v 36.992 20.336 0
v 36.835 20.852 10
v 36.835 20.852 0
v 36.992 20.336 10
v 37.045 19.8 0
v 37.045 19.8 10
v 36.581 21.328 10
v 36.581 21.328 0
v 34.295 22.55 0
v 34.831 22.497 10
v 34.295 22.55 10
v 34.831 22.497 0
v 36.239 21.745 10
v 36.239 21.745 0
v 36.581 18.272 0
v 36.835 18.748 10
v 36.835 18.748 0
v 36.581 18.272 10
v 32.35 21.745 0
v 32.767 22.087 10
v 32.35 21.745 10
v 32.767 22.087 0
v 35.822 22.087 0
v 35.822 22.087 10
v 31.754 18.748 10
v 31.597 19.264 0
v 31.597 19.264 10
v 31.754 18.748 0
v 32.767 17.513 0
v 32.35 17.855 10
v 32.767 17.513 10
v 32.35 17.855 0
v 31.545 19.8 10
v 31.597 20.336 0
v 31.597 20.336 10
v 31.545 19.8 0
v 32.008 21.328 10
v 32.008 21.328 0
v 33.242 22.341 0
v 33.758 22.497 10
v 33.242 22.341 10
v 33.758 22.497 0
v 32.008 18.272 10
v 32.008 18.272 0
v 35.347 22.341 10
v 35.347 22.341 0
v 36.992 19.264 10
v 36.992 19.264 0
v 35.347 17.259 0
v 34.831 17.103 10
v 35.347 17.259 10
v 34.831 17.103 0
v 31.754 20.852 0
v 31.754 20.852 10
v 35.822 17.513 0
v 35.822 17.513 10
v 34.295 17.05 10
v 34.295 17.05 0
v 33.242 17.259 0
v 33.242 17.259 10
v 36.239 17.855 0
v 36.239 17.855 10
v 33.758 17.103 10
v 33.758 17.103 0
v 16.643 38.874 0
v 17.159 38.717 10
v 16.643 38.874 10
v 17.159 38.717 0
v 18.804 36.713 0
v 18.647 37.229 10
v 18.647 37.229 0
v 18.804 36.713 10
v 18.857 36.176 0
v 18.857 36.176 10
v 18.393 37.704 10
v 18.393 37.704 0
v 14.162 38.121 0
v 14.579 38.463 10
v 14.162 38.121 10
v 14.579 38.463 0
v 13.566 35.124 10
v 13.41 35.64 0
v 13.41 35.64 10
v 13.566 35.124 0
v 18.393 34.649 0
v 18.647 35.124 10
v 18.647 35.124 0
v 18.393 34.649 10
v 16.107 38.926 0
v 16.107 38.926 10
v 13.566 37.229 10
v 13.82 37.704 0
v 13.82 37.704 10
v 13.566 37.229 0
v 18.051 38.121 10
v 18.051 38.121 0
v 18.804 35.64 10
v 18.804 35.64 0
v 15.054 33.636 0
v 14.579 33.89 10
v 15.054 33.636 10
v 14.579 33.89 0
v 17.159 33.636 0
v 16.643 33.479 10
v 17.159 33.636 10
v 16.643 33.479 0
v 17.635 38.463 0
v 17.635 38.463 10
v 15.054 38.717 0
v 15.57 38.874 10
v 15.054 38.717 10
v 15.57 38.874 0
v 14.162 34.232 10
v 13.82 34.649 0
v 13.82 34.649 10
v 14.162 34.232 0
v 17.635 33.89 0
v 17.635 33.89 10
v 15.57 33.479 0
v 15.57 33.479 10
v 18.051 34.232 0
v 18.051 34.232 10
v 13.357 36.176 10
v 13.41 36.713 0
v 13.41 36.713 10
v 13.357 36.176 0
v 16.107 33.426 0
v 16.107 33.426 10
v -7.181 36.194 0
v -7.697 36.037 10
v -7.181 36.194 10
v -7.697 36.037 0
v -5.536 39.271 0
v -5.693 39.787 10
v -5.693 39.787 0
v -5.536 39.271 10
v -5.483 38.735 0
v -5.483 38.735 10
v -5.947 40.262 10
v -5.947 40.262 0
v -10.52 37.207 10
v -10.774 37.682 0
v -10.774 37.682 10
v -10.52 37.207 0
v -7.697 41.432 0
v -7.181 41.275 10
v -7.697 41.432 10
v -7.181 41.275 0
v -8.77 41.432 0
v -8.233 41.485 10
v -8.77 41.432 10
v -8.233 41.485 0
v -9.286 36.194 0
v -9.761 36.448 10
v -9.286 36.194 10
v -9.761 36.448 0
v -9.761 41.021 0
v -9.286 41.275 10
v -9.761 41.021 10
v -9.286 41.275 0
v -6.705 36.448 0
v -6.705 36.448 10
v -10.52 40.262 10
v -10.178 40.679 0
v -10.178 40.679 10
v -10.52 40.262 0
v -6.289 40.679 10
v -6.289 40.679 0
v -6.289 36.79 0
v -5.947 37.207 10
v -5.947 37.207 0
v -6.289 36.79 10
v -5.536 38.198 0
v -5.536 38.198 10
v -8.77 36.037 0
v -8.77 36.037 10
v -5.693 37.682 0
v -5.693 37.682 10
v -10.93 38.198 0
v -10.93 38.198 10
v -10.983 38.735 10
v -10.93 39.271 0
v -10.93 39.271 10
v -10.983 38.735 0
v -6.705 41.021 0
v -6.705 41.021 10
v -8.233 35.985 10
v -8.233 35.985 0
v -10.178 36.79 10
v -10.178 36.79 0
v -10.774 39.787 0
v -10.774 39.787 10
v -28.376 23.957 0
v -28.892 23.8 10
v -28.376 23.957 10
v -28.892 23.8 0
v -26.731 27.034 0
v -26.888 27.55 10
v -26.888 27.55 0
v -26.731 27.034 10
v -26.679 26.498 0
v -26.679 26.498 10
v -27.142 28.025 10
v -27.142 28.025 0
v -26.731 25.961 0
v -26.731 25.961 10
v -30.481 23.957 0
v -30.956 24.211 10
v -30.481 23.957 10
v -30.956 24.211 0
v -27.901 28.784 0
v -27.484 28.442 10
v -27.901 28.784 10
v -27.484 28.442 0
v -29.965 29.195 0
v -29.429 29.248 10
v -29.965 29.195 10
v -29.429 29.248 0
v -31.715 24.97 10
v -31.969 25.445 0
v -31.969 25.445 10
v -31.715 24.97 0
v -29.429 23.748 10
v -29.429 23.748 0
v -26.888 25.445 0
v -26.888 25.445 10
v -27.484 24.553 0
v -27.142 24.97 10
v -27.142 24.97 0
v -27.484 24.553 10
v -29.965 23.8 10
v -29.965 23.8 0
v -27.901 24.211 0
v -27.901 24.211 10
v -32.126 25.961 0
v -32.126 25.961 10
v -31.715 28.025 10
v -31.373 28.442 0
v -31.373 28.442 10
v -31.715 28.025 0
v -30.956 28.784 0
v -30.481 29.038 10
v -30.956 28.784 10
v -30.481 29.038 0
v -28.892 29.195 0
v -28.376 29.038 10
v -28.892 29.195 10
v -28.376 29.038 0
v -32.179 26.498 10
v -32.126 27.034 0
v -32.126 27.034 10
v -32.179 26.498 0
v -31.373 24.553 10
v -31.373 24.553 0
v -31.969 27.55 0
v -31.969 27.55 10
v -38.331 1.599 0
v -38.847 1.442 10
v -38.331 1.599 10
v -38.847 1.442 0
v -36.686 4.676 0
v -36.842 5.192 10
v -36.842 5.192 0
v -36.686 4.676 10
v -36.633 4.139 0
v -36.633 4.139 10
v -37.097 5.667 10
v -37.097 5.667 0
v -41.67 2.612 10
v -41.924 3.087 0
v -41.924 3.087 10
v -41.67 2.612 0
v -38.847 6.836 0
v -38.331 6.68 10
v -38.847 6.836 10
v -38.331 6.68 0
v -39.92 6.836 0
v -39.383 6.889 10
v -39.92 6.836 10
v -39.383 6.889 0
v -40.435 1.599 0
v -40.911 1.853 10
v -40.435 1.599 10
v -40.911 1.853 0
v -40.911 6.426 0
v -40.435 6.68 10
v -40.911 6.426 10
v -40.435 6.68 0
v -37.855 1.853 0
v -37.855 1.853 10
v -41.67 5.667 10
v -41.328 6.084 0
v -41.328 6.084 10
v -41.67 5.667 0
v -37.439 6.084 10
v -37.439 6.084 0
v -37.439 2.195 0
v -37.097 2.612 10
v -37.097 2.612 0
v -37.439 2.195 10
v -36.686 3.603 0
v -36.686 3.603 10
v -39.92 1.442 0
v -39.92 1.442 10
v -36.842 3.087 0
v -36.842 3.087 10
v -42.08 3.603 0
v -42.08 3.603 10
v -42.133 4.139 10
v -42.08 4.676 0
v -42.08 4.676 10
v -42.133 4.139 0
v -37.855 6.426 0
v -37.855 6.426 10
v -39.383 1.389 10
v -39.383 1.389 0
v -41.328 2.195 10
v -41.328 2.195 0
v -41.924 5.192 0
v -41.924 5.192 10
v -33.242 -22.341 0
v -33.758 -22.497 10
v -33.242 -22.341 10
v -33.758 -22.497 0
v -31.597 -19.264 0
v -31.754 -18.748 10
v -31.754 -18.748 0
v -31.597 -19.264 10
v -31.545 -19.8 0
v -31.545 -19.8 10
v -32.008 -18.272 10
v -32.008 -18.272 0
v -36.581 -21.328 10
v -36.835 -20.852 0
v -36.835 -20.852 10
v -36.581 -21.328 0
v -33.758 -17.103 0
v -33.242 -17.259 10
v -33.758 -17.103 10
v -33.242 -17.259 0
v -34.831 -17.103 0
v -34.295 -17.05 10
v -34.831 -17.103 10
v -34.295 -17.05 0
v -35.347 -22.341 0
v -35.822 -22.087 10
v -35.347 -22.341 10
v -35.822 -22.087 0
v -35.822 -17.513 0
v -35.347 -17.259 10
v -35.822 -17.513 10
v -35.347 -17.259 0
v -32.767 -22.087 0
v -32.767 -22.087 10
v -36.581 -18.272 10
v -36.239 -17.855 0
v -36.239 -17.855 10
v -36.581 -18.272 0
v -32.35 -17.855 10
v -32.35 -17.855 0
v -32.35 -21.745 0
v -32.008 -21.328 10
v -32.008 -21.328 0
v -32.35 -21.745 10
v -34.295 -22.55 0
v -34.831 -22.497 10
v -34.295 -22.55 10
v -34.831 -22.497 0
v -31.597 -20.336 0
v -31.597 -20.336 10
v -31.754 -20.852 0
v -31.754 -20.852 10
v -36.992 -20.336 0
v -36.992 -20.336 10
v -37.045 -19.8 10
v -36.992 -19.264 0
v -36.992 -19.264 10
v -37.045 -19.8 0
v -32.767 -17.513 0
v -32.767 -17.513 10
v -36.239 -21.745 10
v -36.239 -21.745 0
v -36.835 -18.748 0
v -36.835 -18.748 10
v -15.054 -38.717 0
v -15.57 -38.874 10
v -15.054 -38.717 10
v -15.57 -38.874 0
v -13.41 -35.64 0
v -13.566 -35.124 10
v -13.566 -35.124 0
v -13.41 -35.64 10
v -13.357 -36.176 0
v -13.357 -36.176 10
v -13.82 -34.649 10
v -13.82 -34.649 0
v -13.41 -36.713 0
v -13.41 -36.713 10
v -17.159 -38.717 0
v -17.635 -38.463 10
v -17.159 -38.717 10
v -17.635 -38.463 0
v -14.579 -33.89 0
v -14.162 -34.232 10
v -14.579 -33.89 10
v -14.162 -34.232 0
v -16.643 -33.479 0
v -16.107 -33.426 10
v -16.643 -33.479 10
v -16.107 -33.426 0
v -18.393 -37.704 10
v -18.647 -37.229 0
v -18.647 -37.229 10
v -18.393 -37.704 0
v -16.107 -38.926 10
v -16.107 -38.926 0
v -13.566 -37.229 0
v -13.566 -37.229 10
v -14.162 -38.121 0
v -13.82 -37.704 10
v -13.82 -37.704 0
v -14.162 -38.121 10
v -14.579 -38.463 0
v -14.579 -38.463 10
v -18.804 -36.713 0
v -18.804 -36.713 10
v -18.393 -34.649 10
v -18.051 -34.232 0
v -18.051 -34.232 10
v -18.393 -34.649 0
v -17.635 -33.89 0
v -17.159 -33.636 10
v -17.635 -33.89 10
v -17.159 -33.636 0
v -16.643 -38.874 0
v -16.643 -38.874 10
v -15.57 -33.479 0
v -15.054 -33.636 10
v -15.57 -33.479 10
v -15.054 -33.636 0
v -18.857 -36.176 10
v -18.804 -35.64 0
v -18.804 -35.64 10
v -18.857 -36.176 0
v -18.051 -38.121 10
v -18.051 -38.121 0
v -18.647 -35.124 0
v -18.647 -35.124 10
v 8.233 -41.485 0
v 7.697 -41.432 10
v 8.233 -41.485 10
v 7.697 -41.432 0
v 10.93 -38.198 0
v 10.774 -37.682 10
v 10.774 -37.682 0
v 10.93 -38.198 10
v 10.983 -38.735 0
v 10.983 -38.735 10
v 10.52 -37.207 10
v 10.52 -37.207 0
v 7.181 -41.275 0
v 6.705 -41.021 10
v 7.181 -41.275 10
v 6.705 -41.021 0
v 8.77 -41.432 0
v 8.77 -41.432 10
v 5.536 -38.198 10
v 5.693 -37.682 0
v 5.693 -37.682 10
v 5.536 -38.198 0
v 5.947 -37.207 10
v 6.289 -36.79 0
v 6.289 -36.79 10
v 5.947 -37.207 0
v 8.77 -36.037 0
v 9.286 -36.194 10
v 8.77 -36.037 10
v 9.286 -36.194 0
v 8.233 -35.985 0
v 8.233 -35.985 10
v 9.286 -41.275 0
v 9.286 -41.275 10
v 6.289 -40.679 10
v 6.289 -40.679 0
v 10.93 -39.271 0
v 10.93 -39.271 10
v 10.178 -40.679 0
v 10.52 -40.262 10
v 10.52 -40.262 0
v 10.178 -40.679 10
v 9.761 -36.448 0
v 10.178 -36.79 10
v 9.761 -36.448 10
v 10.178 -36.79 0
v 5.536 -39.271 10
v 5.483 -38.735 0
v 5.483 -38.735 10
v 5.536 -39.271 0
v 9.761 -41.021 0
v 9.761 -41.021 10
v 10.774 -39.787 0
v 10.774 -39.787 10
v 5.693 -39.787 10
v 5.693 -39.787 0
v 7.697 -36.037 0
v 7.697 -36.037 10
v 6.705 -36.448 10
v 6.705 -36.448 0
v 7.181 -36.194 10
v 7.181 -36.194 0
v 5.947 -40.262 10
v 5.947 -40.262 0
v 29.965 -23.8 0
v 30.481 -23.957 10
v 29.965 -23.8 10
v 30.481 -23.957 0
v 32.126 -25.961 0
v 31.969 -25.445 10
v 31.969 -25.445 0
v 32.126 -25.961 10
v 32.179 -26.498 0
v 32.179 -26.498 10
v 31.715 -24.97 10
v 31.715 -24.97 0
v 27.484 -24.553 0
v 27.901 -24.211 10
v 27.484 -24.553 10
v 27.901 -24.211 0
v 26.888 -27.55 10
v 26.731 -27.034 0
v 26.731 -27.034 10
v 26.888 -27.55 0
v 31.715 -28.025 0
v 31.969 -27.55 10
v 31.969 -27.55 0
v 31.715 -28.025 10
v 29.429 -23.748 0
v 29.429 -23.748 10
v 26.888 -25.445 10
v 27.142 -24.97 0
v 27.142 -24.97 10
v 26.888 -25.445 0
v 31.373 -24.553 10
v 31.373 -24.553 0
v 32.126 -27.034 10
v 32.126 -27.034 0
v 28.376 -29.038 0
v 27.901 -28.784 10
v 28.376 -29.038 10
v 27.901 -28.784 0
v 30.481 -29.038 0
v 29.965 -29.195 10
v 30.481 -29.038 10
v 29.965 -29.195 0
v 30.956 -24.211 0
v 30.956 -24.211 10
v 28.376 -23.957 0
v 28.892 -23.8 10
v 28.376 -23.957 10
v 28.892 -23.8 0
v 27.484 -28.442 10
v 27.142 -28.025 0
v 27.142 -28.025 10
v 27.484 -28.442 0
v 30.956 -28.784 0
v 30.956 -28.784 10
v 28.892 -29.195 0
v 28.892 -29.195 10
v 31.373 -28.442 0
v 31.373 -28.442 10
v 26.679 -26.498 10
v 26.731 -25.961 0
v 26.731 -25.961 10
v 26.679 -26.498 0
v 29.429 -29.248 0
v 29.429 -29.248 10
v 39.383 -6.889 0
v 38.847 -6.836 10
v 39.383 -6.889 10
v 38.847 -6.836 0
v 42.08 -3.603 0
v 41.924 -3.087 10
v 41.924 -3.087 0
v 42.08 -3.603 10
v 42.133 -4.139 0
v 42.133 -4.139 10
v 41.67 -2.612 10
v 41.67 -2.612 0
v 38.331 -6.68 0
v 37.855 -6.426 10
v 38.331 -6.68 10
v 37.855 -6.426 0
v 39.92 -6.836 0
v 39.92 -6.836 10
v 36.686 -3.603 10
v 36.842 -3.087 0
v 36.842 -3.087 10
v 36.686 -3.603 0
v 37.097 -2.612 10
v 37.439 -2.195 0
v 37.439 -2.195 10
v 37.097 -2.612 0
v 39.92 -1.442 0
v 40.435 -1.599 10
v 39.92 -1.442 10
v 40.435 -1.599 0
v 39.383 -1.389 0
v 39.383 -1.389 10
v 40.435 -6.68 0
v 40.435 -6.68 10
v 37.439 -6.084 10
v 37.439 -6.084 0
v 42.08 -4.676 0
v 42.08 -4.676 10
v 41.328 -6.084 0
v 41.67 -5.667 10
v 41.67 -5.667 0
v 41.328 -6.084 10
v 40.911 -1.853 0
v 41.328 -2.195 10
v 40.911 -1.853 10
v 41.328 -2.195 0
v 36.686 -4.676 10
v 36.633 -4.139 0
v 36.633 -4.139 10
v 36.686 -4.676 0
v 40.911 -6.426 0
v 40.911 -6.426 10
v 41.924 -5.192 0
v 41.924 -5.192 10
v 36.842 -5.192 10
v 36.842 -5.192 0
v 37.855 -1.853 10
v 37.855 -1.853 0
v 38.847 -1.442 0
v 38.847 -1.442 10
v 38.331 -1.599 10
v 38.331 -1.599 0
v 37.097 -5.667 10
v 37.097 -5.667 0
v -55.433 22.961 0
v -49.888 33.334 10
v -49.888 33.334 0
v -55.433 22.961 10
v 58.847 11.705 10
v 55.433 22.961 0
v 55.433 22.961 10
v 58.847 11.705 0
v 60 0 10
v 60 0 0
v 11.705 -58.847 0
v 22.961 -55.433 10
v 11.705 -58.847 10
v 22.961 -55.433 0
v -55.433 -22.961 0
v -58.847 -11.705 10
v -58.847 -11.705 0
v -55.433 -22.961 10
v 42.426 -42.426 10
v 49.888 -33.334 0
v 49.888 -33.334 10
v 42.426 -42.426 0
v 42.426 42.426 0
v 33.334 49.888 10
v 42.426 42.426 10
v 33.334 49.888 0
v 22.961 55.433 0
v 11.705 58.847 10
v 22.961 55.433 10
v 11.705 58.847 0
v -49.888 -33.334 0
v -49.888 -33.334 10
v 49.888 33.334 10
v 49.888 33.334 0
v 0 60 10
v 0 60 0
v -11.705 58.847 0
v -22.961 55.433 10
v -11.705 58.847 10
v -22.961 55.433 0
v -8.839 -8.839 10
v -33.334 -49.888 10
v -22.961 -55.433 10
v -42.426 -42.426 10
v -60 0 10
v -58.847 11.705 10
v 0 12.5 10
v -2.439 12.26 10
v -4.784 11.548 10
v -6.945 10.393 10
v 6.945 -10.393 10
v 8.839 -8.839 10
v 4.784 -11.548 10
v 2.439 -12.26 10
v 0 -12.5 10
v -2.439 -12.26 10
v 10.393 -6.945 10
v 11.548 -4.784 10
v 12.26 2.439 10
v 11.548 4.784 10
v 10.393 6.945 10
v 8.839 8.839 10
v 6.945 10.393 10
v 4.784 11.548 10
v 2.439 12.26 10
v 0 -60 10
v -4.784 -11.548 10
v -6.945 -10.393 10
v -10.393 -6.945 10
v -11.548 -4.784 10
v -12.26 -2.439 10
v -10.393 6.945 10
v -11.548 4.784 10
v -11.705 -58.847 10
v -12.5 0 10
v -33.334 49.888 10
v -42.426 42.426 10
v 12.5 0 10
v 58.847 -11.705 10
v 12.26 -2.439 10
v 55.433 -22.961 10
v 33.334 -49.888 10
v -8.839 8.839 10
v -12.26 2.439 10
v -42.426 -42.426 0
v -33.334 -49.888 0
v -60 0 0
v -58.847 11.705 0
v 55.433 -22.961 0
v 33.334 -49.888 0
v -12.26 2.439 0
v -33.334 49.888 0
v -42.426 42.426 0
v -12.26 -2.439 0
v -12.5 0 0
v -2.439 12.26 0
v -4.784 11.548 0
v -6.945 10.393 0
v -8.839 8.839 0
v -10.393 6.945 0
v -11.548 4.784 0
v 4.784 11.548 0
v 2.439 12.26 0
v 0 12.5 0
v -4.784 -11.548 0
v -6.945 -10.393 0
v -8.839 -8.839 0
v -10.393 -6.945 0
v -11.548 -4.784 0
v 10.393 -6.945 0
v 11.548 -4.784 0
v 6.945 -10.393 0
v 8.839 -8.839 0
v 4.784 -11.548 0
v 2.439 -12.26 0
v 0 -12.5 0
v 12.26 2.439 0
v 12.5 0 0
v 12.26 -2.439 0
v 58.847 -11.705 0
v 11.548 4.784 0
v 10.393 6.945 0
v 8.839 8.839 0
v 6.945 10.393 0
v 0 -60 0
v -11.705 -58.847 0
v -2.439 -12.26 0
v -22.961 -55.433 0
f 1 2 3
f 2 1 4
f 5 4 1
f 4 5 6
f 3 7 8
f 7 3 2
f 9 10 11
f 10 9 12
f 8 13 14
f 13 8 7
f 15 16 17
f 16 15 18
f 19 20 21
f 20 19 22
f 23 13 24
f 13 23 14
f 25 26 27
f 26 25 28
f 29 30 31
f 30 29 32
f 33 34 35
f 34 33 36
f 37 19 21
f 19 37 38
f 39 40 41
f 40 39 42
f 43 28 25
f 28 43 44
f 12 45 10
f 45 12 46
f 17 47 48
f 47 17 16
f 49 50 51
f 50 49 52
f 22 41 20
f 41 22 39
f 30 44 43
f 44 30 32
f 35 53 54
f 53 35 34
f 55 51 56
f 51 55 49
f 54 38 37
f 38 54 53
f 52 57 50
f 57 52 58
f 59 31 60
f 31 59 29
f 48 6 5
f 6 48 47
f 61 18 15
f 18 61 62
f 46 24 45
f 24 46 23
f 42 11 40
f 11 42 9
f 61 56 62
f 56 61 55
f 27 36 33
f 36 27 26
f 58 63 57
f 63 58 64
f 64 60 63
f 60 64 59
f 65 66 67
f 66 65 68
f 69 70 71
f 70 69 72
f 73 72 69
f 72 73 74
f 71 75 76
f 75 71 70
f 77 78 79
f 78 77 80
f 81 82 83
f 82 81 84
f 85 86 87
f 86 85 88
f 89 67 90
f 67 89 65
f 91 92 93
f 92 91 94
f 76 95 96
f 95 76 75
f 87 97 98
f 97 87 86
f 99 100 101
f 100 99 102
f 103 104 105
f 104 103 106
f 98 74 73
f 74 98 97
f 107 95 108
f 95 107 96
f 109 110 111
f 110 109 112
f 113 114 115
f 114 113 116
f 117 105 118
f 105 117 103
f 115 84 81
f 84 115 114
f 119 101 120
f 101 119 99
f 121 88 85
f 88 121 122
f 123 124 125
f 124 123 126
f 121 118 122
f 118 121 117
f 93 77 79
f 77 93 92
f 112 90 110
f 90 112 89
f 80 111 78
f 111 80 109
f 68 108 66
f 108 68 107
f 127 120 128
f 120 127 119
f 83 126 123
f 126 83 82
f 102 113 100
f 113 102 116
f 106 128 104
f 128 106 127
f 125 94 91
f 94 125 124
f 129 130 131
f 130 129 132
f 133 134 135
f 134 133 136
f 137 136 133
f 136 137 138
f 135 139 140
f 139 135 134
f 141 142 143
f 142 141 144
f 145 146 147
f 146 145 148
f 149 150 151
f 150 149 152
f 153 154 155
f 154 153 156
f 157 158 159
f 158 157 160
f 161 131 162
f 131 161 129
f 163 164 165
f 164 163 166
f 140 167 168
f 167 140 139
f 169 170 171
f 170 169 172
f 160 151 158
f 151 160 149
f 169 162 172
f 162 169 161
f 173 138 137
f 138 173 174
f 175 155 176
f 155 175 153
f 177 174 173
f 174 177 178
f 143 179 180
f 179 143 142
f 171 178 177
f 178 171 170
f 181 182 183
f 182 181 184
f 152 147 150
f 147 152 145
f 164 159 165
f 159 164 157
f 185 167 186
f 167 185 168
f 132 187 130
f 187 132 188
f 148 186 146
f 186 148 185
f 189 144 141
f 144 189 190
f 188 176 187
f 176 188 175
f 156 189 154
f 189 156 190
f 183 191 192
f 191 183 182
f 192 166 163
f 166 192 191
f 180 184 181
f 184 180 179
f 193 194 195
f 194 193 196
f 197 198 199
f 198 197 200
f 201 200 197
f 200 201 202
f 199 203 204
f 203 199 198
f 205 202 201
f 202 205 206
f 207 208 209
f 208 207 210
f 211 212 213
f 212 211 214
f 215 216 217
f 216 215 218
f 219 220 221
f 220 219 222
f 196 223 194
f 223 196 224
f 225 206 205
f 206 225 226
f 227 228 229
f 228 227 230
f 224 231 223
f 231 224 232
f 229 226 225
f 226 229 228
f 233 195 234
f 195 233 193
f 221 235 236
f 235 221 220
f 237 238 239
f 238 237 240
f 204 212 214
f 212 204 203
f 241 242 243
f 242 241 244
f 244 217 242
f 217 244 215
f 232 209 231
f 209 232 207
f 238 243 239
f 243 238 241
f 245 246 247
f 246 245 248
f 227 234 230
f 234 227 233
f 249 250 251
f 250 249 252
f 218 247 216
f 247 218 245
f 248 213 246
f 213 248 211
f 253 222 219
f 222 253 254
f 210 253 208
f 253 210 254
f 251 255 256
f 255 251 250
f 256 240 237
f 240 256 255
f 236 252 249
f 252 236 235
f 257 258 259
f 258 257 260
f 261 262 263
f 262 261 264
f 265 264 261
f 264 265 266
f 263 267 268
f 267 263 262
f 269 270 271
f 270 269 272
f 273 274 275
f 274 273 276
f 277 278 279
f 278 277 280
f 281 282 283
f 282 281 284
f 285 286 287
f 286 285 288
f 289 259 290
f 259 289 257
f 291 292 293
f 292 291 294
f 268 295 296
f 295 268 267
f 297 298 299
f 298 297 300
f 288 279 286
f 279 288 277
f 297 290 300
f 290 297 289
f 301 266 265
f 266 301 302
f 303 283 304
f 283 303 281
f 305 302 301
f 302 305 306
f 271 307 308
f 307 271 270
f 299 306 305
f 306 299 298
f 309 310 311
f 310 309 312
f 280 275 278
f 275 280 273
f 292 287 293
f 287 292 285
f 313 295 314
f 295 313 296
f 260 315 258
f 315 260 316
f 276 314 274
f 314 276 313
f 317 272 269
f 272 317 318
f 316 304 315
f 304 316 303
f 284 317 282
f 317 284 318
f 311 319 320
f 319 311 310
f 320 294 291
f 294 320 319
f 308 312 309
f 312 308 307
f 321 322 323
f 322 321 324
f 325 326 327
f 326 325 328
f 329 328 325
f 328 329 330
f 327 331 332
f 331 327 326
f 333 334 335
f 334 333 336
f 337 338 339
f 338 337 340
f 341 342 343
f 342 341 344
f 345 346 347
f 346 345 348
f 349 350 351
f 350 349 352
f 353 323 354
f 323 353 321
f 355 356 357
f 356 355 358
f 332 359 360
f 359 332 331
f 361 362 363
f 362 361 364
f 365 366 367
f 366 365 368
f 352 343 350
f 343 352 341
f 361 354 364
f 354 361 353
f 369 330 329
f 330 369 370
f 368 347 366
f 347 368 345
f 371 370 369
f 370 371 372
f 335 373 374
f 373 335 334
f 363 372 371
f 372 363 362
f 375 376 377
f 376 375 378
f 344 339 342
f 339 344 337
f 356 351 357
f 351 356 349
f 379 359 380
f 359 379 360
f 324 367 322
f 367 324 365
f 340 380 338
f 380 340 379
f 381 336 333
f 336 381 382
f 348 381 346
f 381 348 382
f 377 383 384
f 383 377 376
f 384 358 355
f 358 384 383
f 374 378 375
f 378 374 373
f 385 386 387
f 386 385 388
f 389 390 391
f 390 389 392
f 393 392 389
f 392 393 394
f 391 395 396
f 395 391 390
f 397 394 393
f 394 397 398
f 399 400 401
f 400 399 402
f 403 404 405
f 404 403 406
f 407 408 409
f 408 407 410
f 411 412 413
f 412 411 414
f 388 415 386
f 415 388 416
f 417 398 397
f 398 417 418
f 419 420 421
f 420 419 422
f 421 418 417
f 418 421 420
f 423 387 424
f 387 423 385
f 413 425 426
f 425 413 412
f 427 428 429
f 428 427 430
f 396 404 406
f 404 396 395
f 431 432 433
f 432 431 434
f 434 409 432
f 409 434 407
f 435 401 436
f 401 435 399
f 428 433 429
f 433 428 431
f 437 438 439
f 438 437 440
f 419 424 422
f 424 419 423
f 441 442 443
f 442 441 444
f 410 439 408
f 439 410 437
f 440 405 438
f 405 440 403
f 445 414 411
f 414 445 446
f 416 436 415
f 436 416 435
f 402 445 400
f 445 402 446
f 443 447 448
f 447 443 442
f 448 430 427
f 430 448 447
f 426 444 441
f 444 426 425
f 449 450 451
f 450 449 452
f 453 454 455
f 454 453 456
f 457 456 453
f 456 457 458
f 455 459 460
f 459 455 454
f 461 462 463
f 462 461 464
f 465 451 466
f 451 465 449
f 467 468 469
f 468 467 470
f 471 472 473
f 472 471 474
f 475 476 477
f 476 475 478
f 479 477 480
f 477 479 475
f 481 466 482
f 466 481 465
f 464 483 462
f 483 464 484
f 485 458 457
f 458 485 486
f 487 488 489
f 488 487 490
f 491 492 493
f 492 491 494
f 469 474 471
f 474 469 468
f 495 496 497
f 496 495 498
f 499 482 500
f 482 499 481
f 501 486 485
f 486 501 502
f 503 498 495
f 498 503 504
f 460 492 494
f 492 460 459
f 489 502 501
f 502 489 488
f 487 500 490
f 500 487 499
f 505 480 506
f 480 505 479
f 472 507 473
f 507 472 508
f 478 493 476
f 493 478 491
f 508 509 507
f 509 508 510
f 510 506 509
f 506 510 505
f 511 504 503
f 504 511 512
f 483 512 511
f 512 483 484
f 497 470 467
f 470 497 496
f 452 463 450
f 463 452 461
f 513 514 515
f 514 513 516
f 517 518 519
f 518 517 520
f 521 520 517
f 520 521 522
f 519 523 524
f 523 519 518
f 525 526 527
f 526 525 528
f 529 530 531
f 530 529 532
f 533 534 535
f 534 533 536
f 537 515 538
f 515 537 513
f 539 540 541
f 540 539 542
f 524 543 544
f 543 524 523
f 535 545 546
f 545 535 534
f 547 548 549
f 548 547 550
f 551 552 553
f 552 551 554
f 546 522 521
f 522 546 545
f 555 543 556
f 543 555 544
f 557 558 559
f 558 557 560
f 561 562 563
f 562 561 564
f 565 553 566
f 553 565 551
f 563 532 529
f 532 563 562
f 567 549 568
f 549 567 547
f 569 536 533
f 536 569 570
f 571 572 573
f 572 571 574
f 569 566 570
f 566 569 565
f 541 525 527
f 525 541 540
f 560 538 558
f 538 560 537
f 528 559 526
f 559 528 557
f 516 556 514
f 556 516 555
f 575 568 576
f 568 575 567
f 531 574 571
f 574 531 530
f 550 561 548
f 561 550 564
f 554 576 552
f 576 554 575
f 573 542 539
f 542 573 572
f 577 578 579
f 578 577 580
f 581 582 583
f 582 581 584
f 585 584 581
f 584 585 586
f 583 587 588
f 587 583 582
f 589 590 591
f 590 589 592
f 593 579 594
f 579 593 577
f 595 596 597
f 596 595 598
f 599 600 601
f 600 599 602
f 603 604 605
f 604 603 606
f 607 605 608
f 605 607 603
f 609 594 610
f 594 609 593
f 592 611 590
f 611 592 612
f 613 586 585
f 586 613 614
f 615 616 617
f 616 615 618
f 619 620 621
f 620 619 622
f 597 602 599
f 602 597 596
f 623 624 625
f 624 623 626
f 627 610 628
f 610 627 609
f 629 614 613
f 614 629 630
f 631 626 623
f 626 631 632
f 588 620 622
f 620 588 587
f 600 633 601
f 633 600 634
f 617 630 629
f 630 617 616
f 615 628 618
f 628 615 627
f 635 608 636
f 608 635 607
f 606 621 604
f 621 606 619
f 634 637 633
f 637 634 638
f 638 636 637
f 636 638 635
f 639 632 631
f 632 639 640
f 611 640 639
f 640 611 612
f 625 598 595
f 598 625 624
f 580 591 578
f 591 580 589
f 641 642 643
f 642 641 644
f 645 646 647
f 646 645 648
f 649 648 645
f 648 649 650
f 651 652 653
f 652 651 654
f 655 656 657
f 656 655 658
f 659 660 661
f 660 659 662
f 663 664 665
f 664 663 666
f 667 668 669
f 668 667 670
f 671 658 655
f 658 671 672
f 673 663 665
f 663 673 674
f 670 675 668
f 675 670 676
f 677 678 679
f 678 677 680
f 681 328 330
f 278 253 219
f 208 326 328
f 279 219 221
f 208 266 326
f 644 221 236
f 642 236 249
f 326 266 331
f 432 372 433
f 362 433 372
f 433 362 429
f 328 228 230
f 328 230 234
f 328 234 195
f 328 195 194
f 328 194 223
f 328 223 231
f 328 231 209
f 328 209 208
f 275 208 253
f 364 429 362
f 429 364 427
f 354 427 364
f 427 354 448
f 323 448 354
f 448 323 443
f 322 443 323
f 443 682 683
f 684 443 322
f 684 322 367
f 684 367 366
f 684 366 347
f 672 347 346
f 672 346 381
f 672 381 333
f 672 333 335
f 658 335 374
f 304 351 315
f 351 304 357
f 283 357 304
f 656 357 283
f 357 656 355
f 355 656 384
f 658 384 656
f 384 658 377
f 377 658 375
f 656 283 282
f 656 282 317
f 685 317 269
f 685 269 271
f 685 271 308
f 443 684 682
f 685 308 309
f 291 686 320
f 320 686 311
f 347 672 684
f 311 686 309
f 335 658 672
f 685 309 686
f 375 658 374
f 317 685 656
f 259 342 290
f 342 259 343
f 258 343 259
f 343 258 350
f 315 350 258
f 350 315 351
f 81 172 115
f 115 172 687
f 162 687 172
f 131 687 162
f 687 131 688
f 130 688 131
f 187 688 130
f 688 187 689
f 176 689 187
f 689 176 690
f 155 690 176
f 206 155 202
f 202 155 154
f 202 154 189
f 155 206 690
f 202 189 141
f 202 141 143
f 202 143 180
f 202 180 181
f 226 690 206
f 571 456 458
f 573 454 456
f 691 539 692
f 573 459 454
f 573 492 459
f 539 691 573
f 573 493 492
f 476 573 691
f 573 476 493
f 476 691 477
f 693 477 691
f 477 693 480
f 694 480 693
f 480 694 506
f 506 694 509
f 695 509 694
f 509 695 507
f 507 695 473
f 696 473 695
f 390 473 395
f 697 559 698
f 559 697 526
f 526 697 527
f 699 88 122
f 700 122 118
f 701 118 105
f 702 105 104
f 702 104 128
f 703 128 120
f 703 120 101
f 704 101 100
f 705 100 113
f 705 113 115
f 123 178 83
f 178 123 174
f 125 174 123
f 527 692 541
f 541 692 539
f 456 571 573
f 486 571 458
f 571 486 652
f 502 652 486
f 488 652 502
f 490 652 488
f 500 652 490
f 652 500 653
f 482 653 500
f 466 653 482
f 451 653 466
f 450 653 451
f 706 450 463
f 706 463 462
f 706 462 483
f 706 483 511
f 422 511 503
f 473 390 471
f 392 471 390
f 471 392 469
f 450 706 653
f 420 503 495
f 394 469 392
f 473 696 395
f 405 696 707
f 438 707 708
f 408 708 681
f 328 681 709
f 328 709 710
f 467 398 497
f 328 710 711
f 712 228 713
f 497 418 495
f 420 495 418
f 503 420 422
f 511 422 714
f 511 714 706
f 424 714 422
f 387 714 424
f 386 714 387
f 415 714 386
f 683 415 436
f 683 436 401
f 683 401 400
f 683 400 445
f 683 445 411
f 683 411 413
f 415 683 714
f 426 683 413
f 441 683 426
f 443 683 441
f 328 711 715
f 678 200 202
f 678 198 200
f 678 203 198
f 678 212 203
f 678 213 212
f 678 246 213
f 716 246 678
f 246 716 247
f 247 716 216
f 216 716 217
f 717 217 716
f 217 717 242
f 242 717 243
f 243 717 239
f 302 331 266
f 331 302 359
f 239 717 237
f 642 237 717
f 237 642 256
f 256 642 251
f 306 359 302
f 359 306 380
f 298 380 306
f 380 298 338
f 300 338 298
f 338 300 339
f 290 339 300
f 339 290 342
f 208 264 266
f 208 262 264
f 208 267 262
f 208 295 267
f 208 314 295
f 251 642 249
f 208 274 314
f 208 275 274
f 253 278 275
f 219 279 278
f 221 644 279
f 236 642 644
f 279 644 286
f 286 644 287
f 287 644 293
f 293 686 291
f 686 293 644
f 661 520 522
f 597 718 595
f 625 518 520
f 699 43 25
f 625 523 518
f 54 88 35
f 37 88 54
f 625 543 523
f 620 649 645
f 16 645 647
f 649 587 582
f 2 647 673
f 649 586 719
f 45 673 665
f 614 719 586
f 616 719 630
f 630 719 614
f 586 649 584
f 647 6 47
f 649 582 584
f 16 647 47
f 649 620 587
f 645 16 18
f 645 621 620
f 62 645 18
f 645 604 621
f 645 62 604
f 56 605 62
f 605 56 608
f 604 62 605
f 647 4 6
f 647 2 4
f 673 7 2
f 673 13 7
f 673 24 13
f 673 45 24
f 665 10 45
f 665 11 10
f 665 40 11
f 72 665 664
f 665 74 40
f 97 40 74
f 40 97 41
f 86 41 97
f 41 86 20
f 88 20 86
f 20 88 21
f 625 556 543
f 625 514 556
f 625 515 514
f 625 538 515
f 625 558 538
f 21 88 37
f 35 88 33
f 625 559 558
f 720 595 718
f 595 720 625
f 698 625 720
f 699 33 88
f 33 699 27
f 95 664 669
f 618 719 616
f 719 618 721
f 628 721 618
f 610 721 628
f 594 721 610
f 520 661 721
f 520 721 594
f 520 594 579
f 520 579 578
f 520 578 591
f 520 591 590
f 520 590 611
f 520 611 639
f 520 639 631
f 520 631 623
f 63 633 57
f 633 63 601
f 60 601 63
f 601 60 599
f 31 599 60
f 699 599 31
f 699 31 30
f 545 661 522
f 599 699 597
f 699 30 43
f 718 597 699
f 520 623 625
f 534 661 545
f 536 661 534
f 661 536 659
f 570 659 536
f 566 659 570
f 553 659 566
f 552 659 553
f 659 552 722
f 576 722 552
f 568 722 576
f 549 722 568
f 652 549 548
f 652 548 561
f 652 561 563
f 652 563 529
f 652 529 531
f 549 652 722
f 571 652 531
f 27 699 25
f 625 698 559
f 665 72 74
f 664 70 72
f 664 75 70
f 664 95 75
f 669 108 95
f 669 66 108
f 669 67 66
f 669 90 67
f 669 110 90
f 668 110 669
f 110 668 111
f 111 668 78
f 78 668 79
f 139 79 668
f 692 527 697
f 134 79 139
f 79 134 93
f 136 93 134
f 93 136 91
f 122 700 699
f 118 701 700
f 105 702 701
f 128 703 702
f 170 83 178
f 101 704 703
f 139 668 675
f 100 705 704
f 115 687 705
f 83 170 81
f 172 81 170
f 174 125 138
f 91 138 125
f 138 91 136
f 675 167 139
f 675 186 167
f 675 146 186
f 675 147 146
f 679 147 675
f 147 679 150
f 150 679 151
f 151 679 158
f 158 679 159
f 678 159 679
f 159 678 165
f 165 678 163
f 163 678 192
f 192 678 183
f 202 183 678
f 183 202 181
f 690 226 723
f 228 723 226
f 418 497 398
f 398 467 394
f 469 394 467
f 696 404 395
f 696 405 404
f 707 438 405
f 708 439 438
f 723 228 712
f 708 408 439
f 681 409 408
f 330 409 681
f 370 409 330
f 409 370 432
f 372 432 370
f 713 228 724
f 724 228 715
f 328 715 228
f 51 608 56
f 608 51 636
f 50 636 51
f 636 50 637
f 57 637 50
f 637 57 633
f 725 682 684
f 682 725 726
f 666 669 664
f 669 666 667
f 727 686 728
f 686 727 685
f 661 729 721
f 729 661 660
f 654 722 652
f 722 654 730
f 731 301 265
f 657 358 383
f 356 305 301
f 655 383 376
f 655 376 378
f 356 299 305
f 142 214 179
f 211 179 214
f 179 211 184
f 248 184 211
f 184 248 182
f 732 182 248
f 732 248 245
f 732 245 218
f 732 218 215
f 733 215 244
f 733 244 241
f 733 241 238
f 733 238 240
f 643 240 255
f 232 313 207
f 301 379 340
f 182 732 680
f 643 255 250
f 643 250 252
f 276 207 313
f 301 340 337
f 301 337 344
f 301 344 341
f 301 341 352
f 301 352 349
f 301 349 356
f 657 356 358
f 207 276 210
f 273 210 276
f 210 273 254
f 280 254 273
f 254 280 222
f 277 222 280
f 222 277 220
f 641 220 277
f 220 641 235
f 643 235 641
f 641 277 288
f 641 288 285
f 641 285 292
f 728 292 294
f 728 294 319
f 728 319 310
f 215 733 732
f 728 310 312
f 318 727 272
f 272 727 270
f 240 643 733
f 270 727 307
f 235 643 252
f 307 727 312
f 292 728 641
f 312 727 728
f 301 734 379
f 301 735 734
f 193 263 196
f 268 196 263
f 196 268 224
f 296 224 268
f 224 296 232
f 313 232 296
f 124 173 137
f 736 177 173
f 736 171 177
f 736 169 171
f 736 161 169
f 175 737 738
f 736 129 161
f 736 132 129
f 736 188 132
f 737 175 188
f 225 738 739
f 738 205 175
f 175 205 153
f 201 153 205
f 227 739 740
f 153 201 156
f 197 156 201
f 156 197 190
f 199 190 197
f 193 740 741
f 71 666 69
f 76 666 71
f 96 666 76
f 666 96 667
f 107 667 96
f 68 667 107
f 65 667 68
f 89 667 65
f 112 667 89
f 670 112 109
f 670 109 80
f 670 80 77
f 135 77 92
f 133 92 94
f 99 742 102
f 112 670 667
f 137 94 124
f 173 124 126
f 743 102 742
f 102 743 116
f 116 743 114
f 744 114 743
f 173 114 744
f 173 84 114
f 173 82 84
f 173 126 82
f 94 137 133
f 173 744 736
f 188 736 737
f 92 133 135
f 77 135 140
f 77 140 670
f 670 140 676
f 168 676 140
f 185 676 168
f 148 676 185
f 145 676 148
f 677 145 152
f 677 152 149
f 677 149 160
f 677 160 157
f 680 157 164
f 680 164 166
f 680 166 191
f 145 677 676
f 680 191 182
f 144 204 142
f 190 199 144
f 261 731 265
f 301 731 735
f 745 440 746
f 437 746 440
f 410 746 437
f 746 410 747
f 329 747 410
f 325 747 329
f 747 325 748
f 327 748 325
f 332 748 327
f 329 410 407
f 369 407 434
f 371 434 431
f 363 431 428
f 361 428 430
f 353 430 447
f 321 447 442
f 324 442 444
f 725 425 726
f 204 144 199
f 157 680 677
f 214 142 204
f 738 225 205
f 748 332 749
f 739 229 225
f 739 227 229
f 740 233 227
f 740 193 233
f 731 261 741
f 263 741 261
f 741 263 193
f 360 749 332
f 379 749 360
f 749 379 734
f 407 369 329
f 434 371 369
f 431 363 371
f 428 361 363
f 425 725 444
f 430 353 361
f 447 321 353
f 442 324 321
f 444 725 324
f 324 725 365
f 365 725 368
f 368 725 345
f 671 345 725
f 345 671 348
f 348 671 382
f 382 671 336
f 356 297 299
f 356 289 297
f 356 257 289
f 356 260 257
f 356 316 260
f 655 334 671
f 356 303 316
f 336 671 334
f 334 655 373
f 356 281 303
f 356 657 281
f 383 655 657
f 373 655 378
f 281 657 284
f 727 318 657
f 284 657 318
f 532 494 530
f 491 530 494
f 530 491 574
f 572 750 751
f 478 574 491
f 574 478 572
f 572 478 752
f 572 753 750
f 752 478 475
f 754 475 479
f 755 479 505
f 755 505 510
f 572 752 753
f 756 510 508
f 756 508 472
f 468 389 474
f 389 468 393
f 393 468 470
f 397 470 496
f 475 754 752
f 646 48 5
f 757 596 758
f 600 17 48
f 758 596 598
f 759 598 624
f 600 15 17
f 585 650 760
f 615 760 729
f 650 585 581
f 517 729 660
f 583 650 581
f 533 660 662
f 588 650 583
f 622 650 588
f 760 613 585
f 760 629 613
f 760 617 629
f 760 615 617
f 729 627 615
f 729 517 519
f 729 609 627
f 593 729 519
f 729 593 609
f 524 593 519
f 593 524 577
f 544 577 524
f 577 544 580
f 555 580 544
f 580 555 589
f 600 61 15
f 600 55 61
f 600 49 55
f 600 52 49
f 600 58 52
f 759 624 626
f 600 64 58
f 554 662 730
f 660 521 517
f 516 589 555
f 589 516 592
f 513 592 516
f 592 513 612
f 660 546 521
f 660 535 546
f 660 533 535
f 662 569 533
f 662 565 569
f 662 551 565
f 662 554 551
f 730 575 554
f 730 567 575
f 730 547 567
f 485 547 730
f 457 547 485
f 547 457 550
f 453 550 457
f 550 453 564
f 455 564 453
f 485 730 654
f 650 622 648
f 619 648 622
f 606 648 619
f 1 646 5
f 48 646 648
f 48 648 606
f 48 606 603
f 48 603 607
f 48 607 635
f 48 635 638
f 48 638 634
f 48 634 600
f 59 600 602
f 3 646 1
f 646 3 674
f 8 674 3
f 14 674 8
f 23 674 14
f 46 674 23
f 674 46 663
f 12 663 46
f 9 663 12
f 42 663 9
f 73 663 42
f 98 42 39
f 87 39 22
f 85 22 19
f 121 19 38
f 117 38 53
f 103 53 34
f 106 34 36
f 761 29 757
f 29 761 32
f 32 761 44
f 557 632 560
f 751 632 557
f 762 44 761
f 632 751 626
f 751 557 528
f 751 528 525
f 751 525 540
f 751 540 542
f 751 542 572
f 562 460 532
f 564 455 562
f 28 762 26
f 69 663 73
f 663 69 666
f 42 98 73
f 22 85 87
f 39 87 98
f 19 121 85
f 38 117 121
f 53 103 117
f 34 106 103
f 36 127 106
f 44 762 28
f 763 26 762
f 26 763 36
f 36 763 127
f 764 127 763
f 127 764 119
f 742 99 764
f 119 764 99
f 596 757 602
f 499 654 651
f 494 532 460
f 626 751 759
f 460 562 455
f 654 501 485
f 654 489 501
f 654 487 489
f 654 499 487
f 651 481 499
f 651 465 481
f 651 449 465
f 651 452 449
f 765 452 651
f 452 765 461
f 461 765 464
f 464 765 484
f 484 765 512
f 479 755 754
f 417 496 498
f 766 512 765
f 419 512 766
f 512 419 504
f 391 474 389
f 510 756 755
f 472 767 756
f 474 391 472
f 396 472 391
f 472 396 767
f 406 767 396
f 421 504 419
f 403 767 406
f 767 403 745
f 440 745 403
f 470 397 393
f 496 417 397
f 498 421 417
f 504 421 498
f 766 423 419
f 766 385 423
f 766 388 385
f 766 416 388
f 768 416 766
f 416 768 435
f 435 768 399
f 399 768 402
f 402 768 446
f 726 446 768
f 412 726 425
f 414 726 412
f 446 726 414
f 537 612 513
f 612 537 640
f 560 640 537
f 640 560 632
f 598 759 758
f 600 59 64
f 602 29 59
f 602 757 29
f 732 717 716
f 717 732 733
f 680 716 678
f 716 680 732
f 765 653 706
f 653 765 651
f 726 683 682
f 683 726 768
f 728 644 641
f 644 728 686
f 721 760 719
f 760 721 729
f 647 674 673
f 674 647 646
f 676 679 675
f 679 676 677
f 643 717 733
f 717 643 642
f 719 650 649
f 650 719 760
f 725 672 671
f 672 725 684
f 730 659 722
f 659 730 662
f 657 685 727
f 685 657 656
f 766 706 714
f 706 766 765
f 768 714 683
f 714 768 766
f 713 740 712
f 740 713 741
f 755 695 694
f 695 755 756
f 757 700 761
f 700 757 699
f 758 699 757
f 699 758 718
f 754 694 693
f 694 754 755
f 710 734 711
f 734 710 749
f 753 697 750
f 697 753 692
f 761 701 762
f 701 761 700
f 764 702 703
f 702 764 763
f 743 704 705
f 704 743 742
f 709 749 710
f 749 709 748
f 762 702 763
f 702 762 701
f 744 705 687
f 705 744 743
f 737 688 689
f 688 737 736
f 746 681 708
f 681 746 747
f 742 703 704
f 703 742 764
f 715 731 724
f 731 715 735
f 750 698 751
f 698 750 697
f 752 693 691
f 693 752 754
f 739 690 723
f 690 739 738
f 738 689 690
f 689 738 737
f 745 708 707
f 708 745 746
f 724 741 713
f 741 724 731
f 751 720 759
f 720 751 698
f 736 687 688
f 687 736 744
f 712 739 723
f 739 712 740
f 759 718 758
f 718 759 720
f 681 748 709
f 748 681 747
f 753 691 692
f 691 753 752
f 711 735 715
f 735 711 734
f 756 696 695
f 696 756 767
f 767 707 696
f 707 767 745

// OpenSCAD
$fn = 32;

// ----------------------------------------------------------------------
// Flange Ø120 x 10
// 10 holes on a Ø79.2 bolt circle, bolted joints
// ----------------------------------------------------------------------

// --- parameters (mm) ---
flange_d = 120;  // outside diameter of the flange
thickness = 10;  // flange thickness
holes = 10;      // number of bolt holes
pcd = 79.2;      // bolt circle diameter
start_deg = 30;  // angle of the first hole, from +X
hole_d = 5.5;    // bolt hole diameter
bore_d = 25;     // central through bore
hub_d = 35;      // hub outside diameter
hub_h = 0;       // hub height above the flange face (0 = no hub)

// --- derived feature positions (mm) ---
height = thickness + hub_h;  // = 10   overall height of the part
pcd_r = pcd / 2;             // = 39.6   bolt circle radius
hole_step = 360 / holes;     // = 36   angular pitch
feature_centers = [
  [pcd_r * cos(start_deg + 0 * hole_step), pcd_r * sin(start_deg + 0 * hole_step)],
  [pcd_r * cos(start_deg + 1 * hole_step), pcd_r * sin(start_deg + 1 * hole_step)],
  [pcd_r * cos(start_deg + 2 * hole_step), pcd_r * sin(start_deg + 2 * hole_step)],
  [pcd_r * cos(start_deg + 3 * hole_step), pcd_r * sin(start_deg + 3 * hole_step)],
  [pcd_r * cos(start_deg + 4 * hole_step), pcd_r * sin(start_deg + 4 * hole_step)],
  [pcd_r * cos(start_deg + 5 * hole_step), pcd_r * sin(start_deg + 5 * hole_step)],
  [pcd_r * cos(start_deg + 6 * hole_step), pcd_r * sin(start_deg + 6 * hole_step)],
  [pcd_r * cos(start_deg + 7 * hole_step), pcd_r * sin(start_deg + 7 * hole_step)],
  [pcd_r * cos(start_deg + 8 * hole_step), pcd_r * sin(start_deg + 8 * hole_step)],
  [pcd_r * cos(start_deg + 9 * hole_step), pcd_r * sin(start_deg + 9 * hole_step)]
];   // bolt hole centres on the pitch circle

// flange disc, every hole and the bore cut straight through
difference() {
  union() {
    cylinder(d = flange_d, h = thickness);
  }
  translate([0, 0, -1]) cylinder(d = bore_d, h = height + 2);  // bore, through
  for (centre = feature_centers)
    translate([centre[0], centre[1], -1]) cylinder(d = hole_d, h = thickness + 2);
}
